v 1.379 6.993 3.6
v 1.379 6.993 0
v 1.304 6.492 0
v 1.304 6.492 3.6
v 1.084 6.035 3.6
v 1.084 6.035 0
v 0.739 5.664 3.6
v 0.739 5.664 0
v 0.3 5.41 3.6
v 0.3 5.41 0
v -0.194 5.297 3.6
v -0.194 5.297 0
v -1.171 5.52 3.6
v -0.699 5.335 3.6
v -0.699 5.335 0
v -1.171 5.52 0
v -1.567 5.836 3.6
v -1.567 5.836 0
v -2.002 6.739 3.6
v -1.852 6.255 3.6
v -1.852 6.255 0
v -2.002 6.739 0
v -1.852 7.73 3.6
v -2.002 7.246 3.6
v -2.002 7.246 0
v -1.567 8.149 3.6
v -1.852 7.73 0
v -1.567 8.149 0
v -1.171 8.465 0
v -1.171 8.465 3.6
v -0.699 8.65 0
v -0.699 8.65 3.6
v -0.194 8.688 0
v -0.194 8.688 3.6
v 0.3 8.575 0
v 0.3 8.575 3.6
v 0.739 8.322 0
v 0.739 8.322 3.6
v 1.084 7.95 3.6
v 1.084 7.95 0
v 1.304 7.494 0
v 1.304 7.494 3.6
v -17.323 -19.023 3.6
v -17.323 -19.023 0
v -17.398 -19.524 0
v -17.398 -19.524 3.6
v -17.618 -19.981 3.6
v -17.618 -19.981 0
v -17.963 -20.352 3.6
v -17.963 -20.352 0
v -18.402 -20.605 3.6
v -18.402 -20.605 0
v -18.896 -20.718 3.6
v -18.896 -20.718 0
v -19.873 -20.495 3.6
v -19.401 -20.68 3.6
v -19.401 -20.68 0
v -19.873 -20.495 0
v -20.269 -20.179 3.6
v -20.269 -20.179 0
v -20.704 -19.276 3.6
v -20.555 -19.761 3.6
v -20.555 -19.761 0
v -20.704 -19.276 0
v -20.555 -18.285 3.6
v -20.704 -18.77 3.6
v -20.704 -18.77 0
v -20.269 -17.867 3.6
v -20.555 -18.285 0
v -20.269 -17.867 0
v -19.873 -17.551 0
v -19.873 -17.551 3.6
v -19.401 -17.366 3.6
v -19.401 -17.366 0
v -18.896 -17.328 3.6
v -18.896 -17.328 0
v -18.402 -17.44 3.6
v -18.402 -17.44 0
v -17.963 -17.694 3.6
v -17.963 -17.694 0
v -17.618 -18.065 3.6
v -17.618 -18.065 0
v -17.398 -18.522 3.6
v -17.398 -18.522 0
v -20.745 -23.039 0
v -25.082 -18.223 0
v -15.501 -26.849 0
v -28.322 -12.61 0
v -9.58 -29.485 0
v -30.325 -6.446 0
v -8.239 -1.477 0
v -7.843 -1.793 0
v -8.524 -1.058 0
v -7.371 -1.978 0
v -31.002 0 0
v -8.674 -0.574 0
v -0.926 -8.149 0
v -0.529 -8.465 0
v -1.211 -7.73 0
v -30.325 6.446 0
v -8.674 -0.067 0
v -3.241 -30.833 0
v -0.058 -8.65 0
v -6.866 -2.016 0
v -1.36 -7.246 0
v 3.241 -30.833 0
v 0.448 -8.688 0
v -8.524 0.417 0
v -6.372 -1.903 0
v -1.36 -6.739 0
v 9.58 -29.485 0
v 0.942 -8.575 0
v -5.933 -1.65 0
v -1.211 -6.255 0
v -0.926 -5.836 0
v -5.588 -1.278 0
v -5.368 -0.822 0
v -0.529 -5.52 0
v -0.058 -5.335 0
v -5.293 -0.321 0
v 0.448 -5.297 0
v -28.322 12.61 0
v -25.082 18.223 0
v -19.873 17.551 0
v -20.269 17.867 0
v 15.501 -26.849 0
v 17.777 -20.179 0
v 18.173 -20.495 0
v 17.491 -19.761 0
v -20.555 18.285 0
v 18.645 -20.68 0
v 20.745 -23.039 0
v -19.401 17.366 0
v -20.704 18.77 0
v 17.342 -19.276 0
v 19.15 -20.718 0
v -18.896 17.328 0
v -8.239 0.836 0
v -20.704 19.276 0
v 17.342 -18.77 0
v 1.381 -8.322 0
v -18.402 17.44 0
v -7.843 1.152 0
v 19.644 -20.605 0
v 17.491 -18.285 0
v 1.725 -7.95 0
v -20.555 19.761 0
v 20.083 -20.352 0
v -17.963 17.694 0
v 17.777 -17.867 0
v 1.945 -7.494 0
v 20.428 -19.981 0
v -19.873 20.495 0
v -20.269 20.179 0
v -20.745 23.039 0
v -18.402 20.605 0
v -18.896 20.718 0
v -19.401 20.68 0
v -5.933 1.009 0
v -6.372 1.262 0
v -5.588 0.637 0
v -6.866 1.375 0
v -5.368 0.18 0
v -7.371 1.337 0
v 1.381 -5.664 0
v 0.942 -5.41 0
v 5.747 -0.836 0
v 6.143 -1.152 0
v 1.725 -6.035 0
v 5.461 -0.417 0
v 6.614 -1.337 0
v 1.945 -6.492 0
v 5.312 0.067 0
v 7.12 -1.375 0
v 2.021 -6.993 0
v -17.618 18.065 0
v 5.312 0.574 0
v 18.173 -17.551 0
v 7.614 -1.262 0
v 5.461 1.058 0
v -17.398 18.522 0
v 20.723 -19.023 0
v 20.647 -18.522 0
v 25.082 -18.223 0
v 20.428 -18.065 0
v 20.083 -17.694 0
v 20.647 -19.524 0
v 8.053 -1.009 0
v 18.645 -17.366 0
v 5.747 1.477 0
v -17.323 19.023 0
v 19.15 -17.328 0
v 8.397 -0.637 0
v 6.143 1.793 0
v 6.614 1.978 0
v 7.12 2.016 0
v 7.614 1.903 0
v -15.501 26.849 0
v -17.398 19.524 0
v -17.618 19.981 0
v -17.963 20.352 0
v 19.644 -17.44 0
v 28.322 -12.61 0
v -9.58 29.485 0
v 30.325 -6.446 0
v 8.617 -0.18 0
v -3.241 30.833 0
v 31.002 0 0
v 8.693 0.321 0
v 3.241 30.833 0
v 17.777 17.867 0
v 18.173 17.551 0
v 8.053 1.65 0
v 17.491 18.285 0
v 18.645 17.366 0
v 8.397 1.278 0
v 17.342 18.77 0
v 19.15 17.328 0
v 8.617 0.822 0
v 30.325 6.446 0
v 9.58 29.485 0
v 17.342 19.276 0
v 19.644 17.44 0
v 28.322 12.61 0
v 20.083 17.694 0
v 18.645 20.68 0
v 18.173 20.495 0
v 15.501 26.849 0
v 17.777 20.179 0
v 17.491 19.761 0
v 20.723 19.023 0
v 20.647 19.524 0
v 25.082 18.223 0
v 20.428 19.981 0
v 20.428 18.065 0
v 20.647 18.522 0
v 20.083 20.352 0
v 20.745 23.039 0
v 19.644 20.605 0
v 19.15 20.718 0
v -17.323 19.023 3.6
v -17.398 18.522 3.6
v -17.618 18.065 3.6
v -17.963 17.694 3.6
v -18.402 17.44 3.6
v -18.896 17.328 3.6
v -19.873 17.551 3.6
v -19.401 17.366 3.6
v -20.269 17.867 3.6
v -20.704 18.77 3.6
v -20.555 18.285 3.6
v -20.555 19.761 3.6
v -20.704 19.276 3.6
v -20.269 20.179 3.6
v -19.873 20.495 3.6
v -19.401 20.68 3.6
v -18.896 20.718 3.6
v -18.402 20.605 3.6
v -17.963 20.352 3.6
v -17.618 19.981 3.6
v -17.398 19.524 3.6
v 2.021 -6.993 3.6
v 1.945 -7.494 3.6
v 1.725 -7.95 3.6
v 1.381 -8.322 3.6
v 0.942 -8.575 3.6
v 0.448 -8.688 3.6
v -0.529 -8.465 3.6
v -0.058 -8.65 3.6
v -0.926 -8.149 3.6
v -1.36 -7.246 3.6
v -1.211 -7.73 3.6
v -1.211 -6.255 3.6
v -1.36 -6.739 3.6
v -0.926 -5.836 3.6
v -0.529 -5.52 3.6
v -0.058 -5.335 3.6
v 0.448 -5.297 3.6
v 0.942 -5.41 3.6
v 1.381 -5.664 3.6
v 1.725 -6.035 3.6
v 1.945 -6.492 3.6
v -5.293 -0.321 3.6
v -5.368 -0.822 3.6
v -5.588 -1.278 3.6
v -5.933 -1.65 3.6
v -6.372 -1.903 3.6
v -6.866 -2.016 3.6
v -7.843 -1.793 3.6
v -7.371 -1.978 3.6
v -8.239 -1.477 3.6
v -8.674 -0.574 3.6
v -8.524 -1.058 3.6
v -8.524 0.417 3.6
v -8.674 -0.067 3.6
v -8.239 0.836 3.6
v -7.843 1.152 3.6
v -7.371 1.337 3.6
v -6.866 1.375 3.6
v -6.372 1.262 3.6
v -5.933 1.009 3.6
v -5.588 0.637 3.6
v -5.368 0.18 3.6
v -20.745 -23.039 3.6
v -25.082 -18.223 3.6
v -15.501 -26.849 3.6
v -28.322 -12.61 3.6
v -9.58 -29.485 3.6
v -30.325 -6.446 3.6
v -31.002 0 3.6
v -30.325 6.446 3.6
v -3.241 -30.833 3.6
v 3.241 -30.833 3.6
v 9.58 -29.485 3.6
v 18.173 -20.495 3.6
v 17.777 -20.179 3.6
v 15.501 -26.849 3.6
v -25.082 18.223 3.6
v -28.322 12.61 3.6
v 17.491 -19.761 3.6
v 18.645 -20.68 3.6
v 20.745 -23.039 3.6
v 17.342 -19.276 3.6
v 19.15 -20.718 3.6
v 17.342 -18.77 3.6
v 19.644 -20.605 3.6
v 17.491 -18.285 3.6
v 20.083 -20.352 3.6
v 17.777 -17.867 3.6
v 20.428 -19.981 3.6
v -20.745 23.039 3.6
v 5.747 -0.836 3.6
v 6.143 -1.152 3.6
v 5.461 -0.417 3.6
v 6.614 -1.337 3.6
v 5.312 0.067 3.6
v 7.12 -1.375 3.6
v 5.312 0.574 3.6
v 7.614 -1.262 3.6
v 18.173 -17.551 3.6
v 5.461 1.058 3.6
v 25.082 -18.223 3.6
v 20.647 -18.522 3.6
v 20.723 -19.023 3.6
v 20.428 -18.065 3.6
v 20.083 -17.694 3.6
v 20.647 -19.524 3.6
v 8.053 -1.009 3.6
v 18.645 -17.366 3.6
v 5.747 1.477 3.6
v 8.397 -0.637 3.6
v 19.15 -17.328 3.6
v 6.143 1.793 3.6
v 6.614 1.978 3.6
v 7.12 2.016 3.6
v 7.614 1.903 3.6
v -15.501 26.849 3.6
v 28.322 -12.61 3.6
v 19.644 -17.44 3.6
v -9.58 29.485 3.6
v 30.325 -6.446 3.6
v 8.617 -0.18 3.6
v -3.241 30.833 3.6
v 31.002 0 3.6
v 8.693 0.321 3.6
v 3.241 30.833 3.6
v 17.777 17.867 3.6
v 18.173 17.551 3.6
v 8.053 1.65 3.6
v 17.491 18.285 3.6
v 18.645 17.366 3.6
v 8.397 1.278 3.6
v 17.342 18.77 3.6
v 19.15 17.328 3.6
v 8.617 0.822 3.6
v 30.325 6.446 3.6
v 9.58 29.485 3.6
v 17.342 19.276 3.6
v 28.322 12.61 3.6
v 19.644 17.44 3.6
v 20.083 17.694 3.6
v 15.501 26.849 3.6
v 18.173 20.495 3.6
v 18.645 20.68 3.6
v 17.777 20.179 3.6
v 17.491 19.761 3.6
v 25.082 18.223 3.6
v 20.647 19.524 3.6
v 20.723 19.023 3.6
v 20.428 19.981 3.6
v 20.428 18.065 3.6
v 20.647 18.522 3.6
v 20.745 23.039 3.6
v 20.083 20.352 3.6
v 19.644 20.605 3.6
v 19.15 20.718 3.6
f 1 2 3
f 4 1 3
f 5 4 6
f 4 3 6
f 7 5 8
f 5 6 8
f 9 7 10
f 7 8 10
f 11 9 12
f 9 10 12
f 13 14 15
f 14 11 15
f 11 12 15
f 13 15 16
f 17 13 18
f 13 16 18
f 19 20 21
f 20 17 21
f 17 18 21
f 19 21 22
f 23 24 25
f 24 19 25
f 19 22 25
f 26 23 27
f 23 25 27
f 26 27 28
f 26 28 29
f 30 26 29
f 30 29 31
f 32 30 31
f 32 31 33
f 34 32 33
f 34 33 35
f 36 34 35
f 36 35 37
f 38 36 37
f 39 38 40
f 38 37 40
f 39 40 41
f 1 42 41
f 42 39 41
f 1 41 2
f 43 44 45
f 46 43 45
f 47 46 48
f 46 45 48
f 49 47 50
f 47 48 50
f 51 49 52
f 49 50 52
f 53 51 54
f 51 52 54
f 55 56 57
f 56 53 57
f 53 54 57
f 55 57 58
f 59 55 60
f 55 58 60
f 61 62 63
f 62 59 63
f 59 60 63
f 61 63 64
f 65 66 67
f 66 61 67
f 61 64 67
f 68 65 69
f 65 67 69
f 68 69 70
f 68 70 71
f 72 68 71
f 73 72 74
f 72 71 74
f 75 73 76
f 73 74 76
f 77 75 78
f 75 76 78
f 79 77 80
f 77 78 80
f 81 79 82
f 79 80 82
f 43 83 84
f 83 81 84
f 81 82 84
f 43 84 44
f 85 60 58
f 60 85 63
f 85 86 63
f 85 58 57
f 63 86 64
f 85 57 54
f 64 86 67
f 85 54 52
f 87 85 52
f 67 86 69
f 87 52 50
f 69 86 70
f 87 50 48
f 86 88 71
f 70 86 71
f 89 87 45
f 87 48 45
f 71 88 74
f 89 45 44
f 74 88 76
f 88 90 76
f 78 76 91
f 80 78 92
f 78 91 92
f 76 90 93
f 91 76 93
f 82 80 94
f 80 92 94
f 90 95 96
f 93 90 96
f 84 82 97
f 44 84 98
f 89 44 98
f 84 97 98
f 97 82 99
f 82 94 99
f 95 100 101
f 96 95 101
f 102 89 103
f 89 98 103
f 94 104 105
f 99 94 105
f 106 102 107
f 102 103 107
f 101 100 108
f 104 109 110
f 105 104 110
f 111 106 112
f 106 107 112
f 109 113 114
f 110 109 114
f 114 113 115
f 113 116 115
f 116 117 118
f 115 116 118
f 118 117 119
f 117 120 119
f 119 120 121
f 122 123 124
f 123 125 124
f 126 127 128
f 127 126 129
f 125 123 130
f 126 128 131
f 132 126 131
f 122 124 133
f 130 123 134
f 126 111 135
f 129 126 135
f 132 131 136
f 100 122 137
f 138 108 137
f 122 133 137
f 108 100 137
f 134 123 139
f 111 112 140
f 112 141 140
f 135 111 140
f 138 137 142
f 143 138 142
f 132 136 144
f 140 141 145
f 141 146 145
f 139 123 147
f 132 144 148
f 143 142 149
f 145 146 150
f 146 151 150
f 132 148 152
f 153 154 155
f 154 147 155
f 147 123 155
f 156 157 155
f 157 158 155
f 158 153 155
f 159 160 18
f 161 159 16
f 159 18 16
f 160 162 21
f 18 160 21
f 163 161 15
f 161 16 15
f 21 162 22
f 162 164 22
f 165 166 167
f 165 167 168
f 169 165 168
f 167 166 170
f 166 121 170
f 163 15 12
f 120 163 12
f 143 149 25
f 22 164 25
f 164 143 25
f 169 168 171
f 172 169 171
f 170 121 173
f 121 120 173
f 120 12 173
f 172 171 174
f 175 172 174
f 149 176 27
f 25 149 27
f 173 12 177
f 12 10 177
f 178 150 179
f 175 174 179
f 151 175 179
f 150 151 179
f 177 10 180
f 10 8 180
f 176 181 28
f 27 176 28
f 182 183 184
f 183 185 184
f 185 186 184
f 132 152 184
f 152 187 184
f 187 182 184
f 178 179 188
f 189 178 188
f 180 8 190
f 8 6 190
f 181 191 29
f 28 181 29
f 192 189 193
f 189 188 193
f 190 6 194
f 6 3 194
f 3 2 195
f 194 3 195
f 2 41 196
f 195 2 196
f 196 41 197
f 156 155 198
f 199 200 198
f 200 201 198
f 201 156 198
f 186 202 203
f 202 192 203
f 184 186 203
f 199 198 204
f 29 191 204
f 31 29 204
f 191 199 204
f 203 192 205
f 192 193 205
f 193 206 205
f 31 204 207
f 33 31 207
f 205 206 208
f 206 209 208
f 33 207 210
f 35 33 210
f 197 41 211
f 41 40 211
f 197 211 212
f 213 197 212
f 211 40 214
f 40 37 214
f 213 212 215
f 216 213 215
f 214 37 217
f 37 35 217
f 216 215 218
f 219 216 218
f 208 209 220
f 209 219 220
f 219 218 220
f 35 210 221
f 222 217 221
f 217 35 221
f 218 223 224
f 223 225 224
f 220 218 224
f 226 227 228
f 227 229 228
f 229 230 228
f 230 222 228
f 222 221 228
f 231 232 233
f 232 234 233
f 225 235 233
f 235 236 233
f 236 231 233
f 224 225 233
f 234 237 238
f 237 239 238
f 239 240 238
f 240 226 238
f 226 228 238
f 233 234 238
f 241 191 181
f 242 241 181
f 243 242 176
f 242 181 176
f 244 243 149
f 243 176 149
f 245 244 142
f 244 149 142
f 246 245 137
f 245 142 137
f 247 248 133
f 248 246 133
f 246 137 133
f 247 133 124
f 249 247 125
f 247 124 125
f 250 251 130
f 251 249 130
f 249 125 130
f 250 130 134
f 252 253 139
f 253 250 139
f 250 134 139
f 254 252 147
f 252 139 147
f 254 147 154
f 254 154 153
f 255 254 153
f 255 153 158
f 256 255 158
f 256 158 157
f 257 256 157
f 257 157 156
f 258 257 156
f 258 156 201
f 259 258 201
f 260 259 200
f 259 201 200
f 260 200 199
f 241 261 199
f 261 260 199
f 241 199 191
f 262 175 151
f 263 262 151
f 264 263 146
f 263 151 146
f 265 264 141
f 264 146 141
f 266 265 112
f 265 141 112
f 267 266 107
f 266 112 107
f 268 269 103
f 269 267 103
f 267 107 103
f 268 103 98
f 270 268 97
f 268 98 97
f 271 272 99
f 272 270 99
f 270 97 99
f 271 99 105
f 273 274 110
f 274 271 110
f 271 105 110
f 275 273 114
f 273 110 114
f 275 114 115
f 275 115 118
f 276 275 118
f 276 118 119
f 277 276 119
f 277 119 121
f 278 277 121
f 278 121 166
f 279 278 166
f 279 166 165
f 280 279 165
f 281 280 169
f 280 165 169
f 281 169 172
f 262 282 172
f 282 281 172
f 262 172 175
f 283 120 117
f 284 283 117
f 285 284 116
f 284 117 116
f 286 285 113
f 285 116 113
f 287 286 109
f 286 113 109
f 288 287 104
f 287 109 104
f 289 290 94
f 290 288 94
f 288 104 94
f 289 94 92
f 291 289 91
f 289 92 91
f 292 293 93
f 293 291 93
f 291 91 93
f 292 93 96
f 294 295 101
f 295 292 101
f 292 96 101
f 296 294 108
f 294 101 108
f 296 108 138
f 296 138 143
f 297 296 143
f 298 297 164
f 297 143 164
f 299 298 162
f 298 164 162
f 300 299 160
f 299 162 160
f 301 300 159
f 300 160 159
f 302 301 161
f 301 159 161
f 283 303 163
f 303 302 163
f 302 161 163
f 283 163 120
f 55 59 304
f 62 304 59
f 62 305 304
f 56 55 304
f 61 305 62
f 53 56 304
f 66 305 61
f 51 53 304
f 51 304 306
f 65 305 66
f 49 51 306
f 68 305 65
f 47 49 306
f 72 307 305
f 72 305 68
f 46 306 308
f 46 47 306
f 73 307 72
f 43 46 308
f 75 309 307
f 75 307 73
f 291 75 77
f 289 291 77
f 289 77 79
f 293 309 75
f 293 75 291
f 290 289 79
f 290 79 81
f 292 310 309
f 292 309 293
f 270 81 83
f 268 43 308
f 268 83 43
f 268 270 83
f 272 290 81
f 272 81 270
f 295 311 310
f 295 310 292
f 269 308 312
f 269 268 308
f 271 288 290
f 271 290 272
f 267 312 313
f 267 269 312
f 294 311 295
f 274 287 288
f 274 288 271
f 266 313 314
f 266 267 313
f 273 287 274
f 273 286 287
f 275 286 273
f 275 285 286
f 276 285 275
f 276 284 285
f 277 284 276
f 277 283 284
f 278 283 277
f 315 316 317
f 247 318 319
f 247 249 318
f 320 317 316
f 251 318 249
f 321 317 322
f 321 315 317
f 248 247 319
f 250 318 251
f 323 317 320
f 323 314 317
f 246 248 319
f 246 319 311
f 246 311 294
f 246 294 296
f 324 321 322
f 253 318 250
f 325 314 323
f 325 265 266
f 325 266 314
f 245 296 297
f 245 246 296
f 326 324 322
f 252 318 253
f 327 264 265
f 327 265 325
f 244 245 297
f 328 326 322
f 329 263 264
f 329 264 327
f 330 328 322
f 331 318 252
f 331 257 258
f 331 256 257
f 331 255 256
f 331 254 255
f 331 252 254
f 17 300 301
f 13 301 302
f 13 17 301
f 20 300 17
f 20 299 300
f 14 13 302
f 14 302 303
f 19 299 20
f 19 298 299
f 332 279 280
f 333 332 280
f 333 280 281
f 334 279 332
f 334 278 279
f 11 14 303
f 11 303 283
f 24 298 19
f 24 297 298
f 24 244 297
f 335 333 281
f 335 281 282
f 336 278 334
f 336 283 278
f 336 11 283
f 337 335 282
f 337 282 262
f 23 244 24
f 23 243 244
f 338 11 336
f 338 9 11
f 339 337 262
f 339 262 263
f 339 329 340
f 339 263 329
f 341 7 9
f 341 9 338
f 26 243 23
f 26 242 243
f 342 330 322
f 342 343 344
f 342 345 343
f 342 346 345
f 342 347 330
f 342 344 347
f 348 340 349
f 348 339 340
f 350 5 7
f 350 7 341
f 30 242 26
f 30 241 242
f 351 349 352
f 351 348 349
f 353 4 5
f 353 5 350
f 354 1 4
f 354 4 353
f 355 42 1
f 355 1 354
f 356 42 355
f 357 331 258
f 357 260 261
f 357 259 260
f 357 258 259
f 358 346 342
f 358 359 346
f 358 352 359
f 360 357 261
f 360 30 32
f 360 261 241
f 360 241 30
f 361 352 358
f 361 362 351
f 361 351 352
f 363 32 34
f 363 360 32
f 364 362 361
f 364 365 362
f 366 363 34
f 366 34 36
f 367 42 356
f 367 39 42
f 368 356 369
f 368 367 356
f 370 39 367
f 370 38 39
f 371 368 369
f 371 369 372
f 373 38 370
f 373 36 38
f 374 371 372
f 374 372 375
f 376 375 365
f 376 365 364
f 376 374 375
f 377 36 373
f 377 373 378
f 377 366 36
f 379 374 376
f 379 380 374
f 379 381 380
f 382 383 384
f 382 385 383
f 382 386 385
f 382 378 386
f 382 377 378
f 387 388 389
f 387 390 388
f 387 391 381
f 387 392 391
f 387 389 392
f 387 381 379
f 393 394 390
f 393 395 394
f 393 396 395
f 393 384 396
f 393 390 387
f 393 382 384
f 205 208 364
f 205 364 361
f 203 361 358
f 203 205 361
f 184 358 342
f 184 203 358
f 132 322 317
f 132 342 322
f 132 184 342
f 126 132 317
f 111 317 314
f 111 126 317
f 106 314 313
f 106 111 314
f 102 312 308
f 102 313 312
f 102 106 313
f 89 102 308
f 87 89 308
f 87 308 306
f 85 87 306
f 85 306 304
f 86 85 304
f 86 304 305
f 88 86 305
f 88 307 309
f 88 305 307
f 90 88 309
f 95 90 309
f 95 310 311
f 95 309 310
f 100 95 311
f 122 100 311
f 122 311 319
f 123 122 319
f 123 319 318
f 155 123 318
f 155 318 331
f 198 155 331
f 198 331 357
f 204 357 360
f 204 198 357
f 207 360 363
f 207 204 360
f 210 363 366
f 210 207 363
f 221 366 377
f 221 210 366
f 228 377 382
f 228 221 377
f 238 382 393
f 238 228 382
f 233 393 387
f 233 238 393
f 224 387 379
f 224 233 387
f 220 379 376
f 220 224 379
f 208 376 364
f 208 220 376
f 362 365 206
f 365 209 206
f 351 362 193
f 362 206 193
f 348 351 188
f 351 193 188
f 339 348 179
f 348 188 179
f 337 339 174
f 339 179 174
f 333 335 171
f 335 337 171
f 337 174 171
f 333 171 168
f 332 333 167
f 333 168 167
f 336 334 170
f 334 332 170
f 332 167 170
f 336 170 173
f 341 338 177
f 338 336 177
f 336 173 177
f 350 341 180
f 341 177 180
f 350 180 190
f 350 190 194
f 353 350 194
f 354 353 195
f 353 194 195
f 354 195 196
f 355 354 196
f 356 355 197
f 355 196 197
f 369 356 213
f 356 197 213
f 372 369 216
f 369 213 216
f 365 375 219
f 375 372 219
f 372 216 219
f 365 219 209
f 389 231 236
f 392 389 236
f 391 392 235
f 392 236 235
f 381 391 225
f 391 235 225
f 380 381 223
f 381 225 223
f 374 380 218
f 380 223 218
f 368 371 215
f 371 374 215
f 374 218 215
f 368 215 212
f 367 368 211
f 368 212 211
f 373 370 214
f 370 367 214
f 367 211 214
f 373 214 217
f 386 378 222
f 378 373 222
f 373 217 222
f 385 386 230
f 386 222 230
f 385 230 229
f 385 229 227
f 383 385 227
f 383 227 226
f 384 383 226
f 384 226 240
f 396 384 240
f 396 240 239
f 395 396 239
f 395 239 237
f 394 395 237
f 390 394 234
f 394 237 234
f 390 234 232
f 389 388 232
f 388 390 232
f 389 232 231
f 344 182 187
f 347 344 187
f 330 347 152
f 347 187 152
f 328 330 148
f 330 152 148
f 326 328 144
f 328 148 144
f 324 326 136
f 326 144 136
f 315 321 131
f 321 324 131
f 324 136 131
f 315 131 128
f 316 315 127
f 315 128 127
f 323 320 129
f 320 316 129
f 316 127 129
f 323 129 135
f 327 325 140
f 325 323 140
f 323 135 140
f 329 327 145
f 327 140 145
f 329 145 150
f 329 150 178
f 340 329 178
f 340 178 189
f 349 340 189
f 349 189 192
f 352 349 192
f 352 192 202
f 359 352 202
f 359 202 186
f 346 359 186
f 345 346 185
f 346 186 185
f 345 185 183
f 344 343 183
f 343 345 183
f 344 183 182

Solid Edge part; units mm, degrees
sketch "Sketch1" plane through (0, 0, 0) normal (0, 0, 1) x (1, 0, 0)
  circle A0 centre (0, 0) radius 31.0025
  circle A1 centre (19.0229, 19.0229) radius 1.7
  circle A2 centre (19.0229, -19.0229) radius 1.7
  circle A3 centre (-19.0229, -19.0229) radius 1.7
  circle A4 centre (-19.0229, 19.0229) radius 1.7
  circle A5 centre (-0.3206, 6.9927) radius 1.7
  circle A6 centre (6.9927, 0.3206) radius 1.7
  circle A7 centre (0.3206, -6.9927) radius 1.7
  circle A8 centre (-6.9927, -0.3206) radius 1.7
extrude "Protrusion1" add sketch "Sketch1" along normal blind 3.6
